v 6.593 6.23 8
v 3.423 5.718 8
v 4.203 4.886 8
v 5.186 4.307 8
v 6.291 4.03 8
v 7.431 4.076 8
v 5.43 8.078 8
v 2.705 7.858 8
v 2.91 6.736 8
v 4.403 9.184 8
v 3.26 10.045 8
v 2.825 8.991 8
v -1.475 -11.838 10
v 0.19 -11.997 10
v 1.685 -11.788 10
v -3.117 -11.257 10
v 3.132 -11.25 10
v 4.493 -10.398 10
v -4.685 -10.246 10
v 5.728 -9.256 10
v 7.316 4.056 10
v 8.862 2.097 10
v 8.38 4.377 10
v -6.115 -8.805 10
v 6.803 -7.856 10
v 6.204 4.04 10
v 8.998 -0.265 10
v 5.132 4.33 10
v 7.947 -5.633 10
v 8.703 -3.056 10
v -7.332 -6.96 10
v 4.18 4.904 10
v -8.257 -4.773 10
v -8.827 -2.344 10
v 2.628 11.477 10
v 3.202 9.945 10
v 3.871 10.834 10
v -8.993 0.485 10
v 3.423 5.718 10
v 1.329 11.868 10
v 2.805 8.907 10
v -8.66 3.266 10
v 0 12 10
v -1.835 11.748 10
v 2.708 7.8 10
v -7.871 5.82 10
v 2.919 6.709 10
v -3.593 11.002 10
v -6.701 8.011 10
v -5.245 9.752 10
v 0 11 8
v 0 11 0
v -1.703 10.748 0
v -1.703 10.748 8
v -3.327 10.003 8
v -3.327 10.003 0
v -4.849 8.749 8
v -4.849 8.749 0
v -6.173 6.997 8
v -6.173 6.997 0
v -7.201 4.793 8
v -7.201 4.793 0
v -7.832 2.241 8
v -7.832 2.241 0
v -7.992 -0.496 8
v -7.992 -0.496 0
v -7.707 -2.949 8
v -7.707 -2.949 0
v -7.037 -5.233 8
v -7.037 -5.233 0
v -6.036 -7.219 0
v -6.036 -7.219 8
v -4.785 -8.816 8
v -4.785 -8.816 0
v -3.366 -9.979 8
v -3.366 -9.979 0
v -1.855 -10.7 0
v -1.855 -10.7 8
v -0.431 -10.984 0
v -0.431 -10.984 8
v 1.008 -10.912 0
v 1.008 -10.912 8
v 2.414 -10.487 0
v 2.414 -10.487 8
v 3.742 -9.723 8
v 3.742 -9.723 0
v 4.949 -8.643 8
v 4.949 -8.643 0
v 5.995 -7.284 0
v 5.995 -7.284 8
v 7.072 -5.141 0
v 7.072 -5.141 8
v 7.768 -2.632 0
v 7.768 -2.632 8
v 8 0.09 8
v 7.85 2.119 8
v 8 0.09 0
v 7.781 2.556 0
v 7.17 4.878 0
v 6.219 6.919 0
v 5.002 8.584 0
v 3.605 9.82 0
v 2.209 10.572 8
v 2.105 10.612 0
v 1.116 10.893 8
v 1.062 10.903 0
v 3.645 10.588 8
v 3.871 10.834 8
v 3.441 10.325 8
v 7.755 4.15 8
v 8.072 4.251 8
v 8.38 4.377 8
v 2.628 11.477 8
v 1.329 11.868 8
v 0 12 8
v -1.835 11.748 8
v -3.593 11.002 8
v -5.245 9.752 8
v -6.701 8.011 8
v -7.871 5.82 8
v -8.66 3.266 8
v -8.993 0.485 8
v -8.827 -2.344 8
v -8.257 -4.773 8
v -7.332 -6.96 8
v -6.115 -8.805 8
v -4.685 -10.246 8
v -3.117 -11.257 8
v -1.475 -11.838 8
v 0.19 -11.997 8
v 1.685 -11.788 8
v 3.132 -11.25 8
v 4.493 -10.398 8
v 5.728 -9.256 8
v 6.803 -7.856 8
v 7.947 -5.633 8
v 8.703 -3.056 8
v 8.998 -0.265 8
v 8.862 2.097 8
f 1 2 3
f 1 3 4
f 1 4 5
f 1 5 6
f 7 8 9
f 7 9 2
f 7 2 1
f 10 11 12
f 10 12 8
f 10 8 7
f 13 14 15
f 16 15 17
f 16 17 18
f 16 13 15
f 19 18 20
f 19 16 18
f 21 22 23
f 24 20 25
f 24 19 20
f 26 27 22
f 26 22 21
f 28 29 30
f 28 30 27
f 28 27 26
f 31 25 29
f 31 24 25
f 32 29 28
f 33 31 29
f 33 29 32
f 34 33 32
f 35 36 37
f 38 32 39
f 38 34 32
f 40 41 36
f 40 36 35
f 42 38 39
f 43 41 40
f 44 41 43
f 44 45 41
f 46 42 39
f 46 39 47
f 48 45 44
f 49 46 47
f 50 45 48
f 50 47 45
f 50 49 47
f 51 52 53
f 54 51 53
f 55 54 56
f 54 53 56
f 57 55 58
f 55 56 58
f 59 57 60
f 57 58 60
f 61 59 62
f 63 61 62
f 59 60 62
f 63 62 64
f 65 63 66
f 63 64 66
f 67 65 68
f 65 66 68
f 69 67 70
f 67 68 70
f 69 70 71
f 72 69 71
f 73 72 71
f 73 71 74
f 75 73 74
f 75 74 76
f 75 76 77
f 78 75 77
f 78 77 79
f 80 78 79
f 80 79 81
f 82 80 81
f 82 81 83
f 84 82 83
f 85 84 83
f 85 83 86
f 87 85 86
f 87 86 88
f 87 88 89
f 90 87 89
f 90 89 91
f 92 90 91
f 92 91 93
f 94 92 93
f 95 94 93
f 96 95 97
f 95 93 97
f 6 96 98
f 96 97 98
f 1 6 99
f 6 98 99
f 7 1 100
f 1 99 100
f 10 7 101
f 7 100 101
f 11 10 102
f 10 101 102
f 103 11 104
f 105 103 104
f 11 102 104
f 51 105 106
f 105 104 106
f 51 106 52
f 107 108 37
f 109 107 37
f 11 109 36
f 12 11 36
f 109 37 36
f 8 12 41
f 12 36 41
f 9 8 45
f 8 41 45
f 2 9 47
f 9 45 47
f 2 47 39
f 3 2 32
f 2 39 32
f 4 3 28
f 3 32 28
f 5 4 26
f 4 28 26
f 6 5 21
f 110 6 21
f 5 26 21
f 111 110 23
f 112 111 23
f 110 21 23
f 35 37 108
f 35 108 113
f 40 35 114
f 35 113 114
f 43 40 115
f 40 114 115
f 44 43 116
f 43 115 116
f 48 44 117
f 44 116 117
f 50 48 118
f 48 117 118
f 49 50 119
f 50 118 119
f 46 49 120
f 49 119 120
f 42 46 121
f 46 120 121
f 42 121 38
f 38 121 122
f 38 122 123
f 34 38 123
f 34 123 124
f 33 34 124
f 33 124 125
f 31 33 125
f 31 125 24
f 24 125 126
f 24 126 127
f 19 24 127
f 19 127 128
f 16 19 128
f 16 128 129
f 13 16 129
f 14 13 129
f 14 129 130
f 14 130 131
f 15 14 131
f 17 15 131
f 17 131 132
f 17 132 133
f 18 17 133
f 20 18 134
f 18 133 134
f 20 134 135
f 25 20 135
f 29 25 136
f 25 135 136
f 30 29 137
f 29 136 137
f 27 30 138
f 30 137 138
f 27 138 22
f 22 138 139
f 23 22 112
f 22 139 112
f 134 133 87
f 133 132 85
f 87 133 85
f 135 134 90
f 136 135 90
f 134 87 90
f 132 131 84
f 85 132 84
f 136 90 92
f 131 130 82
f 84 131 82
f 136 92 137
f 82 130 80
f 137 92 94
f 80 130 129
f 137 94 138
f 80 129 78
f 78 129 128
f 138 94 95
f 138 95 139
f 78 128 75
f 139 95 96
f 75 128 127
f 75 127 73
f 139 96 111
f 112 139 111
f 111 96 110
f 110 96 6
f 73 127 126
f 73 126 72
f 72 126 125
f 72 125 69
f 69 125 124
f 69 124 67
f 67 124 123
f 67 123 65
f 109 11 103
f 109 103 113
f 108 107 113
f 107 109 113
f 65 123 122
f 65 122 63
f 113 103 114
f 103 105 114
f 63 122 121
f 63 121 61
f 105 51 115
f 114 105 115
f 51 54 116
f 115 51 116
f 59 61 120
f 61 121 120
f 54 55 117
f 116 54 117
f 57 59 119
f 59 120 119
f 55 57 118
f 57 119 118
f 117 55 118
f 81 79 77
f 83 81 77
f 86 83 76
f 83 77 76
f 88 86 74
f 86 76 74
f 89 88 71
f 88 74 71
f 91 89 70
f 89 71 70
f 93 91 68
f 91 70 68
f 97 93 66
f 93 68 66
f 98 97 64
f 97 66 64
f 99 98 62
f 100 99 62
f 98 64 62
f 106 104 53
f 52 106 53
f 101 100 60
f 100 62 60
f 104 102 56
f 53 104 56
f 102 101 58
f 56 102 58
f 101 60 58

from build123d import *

# Parameters (mm, degrees)
CROQUIS1_RX             = 11
CROQUIS1_RY             = 8
SALIENTE_EXTRUIR1_DEPTH = 8
CROQUIS2_RX             = 12
CROQUIS2_RY             = 9
SALIENTE_EXTRUIR2_DEPTH = 2
CROQUIS3_R              = 4
CORTAR_EXTRUIR1_DEPTH   = 2


with BuildPart() as part:
    # Croquis1 → Saliente-Extruir1 (new body)
    with BuildSketch(Plane.XY):
        with Locations(Location((0, 0), (0, 0, 90))):
            Ellipse(CROQUIS1_RX, CROQUIS1_RY)
    extrude(amount=SALIENTE_EXTRUIR1_DEPTH)

    # Croquis2 → Saliente-Extruir2 (add)
    with BuildSketch(Plane.XY.offset(8)):
        with Locations(Location((0, 0), (0, 0, 90))):
            Ellipse(CROQUIS2_RX, CROQUIS2_RY)
    extrude(amount=SALIENTE_EXTRUIR2_DEPTH)

    # Croquis3 → Cortar-Extruir1 (cut)
    with BuildSketch(Plane.XY.offset(10)):
        with Locations((6.702388813, 8.008660223)):
            Circle(CROQUIS3_R)
    extrude(amount=-CORTAR_EXTRUIR1_DEPTH, mode=Mode.SUBTRACT)


solid = part.part
